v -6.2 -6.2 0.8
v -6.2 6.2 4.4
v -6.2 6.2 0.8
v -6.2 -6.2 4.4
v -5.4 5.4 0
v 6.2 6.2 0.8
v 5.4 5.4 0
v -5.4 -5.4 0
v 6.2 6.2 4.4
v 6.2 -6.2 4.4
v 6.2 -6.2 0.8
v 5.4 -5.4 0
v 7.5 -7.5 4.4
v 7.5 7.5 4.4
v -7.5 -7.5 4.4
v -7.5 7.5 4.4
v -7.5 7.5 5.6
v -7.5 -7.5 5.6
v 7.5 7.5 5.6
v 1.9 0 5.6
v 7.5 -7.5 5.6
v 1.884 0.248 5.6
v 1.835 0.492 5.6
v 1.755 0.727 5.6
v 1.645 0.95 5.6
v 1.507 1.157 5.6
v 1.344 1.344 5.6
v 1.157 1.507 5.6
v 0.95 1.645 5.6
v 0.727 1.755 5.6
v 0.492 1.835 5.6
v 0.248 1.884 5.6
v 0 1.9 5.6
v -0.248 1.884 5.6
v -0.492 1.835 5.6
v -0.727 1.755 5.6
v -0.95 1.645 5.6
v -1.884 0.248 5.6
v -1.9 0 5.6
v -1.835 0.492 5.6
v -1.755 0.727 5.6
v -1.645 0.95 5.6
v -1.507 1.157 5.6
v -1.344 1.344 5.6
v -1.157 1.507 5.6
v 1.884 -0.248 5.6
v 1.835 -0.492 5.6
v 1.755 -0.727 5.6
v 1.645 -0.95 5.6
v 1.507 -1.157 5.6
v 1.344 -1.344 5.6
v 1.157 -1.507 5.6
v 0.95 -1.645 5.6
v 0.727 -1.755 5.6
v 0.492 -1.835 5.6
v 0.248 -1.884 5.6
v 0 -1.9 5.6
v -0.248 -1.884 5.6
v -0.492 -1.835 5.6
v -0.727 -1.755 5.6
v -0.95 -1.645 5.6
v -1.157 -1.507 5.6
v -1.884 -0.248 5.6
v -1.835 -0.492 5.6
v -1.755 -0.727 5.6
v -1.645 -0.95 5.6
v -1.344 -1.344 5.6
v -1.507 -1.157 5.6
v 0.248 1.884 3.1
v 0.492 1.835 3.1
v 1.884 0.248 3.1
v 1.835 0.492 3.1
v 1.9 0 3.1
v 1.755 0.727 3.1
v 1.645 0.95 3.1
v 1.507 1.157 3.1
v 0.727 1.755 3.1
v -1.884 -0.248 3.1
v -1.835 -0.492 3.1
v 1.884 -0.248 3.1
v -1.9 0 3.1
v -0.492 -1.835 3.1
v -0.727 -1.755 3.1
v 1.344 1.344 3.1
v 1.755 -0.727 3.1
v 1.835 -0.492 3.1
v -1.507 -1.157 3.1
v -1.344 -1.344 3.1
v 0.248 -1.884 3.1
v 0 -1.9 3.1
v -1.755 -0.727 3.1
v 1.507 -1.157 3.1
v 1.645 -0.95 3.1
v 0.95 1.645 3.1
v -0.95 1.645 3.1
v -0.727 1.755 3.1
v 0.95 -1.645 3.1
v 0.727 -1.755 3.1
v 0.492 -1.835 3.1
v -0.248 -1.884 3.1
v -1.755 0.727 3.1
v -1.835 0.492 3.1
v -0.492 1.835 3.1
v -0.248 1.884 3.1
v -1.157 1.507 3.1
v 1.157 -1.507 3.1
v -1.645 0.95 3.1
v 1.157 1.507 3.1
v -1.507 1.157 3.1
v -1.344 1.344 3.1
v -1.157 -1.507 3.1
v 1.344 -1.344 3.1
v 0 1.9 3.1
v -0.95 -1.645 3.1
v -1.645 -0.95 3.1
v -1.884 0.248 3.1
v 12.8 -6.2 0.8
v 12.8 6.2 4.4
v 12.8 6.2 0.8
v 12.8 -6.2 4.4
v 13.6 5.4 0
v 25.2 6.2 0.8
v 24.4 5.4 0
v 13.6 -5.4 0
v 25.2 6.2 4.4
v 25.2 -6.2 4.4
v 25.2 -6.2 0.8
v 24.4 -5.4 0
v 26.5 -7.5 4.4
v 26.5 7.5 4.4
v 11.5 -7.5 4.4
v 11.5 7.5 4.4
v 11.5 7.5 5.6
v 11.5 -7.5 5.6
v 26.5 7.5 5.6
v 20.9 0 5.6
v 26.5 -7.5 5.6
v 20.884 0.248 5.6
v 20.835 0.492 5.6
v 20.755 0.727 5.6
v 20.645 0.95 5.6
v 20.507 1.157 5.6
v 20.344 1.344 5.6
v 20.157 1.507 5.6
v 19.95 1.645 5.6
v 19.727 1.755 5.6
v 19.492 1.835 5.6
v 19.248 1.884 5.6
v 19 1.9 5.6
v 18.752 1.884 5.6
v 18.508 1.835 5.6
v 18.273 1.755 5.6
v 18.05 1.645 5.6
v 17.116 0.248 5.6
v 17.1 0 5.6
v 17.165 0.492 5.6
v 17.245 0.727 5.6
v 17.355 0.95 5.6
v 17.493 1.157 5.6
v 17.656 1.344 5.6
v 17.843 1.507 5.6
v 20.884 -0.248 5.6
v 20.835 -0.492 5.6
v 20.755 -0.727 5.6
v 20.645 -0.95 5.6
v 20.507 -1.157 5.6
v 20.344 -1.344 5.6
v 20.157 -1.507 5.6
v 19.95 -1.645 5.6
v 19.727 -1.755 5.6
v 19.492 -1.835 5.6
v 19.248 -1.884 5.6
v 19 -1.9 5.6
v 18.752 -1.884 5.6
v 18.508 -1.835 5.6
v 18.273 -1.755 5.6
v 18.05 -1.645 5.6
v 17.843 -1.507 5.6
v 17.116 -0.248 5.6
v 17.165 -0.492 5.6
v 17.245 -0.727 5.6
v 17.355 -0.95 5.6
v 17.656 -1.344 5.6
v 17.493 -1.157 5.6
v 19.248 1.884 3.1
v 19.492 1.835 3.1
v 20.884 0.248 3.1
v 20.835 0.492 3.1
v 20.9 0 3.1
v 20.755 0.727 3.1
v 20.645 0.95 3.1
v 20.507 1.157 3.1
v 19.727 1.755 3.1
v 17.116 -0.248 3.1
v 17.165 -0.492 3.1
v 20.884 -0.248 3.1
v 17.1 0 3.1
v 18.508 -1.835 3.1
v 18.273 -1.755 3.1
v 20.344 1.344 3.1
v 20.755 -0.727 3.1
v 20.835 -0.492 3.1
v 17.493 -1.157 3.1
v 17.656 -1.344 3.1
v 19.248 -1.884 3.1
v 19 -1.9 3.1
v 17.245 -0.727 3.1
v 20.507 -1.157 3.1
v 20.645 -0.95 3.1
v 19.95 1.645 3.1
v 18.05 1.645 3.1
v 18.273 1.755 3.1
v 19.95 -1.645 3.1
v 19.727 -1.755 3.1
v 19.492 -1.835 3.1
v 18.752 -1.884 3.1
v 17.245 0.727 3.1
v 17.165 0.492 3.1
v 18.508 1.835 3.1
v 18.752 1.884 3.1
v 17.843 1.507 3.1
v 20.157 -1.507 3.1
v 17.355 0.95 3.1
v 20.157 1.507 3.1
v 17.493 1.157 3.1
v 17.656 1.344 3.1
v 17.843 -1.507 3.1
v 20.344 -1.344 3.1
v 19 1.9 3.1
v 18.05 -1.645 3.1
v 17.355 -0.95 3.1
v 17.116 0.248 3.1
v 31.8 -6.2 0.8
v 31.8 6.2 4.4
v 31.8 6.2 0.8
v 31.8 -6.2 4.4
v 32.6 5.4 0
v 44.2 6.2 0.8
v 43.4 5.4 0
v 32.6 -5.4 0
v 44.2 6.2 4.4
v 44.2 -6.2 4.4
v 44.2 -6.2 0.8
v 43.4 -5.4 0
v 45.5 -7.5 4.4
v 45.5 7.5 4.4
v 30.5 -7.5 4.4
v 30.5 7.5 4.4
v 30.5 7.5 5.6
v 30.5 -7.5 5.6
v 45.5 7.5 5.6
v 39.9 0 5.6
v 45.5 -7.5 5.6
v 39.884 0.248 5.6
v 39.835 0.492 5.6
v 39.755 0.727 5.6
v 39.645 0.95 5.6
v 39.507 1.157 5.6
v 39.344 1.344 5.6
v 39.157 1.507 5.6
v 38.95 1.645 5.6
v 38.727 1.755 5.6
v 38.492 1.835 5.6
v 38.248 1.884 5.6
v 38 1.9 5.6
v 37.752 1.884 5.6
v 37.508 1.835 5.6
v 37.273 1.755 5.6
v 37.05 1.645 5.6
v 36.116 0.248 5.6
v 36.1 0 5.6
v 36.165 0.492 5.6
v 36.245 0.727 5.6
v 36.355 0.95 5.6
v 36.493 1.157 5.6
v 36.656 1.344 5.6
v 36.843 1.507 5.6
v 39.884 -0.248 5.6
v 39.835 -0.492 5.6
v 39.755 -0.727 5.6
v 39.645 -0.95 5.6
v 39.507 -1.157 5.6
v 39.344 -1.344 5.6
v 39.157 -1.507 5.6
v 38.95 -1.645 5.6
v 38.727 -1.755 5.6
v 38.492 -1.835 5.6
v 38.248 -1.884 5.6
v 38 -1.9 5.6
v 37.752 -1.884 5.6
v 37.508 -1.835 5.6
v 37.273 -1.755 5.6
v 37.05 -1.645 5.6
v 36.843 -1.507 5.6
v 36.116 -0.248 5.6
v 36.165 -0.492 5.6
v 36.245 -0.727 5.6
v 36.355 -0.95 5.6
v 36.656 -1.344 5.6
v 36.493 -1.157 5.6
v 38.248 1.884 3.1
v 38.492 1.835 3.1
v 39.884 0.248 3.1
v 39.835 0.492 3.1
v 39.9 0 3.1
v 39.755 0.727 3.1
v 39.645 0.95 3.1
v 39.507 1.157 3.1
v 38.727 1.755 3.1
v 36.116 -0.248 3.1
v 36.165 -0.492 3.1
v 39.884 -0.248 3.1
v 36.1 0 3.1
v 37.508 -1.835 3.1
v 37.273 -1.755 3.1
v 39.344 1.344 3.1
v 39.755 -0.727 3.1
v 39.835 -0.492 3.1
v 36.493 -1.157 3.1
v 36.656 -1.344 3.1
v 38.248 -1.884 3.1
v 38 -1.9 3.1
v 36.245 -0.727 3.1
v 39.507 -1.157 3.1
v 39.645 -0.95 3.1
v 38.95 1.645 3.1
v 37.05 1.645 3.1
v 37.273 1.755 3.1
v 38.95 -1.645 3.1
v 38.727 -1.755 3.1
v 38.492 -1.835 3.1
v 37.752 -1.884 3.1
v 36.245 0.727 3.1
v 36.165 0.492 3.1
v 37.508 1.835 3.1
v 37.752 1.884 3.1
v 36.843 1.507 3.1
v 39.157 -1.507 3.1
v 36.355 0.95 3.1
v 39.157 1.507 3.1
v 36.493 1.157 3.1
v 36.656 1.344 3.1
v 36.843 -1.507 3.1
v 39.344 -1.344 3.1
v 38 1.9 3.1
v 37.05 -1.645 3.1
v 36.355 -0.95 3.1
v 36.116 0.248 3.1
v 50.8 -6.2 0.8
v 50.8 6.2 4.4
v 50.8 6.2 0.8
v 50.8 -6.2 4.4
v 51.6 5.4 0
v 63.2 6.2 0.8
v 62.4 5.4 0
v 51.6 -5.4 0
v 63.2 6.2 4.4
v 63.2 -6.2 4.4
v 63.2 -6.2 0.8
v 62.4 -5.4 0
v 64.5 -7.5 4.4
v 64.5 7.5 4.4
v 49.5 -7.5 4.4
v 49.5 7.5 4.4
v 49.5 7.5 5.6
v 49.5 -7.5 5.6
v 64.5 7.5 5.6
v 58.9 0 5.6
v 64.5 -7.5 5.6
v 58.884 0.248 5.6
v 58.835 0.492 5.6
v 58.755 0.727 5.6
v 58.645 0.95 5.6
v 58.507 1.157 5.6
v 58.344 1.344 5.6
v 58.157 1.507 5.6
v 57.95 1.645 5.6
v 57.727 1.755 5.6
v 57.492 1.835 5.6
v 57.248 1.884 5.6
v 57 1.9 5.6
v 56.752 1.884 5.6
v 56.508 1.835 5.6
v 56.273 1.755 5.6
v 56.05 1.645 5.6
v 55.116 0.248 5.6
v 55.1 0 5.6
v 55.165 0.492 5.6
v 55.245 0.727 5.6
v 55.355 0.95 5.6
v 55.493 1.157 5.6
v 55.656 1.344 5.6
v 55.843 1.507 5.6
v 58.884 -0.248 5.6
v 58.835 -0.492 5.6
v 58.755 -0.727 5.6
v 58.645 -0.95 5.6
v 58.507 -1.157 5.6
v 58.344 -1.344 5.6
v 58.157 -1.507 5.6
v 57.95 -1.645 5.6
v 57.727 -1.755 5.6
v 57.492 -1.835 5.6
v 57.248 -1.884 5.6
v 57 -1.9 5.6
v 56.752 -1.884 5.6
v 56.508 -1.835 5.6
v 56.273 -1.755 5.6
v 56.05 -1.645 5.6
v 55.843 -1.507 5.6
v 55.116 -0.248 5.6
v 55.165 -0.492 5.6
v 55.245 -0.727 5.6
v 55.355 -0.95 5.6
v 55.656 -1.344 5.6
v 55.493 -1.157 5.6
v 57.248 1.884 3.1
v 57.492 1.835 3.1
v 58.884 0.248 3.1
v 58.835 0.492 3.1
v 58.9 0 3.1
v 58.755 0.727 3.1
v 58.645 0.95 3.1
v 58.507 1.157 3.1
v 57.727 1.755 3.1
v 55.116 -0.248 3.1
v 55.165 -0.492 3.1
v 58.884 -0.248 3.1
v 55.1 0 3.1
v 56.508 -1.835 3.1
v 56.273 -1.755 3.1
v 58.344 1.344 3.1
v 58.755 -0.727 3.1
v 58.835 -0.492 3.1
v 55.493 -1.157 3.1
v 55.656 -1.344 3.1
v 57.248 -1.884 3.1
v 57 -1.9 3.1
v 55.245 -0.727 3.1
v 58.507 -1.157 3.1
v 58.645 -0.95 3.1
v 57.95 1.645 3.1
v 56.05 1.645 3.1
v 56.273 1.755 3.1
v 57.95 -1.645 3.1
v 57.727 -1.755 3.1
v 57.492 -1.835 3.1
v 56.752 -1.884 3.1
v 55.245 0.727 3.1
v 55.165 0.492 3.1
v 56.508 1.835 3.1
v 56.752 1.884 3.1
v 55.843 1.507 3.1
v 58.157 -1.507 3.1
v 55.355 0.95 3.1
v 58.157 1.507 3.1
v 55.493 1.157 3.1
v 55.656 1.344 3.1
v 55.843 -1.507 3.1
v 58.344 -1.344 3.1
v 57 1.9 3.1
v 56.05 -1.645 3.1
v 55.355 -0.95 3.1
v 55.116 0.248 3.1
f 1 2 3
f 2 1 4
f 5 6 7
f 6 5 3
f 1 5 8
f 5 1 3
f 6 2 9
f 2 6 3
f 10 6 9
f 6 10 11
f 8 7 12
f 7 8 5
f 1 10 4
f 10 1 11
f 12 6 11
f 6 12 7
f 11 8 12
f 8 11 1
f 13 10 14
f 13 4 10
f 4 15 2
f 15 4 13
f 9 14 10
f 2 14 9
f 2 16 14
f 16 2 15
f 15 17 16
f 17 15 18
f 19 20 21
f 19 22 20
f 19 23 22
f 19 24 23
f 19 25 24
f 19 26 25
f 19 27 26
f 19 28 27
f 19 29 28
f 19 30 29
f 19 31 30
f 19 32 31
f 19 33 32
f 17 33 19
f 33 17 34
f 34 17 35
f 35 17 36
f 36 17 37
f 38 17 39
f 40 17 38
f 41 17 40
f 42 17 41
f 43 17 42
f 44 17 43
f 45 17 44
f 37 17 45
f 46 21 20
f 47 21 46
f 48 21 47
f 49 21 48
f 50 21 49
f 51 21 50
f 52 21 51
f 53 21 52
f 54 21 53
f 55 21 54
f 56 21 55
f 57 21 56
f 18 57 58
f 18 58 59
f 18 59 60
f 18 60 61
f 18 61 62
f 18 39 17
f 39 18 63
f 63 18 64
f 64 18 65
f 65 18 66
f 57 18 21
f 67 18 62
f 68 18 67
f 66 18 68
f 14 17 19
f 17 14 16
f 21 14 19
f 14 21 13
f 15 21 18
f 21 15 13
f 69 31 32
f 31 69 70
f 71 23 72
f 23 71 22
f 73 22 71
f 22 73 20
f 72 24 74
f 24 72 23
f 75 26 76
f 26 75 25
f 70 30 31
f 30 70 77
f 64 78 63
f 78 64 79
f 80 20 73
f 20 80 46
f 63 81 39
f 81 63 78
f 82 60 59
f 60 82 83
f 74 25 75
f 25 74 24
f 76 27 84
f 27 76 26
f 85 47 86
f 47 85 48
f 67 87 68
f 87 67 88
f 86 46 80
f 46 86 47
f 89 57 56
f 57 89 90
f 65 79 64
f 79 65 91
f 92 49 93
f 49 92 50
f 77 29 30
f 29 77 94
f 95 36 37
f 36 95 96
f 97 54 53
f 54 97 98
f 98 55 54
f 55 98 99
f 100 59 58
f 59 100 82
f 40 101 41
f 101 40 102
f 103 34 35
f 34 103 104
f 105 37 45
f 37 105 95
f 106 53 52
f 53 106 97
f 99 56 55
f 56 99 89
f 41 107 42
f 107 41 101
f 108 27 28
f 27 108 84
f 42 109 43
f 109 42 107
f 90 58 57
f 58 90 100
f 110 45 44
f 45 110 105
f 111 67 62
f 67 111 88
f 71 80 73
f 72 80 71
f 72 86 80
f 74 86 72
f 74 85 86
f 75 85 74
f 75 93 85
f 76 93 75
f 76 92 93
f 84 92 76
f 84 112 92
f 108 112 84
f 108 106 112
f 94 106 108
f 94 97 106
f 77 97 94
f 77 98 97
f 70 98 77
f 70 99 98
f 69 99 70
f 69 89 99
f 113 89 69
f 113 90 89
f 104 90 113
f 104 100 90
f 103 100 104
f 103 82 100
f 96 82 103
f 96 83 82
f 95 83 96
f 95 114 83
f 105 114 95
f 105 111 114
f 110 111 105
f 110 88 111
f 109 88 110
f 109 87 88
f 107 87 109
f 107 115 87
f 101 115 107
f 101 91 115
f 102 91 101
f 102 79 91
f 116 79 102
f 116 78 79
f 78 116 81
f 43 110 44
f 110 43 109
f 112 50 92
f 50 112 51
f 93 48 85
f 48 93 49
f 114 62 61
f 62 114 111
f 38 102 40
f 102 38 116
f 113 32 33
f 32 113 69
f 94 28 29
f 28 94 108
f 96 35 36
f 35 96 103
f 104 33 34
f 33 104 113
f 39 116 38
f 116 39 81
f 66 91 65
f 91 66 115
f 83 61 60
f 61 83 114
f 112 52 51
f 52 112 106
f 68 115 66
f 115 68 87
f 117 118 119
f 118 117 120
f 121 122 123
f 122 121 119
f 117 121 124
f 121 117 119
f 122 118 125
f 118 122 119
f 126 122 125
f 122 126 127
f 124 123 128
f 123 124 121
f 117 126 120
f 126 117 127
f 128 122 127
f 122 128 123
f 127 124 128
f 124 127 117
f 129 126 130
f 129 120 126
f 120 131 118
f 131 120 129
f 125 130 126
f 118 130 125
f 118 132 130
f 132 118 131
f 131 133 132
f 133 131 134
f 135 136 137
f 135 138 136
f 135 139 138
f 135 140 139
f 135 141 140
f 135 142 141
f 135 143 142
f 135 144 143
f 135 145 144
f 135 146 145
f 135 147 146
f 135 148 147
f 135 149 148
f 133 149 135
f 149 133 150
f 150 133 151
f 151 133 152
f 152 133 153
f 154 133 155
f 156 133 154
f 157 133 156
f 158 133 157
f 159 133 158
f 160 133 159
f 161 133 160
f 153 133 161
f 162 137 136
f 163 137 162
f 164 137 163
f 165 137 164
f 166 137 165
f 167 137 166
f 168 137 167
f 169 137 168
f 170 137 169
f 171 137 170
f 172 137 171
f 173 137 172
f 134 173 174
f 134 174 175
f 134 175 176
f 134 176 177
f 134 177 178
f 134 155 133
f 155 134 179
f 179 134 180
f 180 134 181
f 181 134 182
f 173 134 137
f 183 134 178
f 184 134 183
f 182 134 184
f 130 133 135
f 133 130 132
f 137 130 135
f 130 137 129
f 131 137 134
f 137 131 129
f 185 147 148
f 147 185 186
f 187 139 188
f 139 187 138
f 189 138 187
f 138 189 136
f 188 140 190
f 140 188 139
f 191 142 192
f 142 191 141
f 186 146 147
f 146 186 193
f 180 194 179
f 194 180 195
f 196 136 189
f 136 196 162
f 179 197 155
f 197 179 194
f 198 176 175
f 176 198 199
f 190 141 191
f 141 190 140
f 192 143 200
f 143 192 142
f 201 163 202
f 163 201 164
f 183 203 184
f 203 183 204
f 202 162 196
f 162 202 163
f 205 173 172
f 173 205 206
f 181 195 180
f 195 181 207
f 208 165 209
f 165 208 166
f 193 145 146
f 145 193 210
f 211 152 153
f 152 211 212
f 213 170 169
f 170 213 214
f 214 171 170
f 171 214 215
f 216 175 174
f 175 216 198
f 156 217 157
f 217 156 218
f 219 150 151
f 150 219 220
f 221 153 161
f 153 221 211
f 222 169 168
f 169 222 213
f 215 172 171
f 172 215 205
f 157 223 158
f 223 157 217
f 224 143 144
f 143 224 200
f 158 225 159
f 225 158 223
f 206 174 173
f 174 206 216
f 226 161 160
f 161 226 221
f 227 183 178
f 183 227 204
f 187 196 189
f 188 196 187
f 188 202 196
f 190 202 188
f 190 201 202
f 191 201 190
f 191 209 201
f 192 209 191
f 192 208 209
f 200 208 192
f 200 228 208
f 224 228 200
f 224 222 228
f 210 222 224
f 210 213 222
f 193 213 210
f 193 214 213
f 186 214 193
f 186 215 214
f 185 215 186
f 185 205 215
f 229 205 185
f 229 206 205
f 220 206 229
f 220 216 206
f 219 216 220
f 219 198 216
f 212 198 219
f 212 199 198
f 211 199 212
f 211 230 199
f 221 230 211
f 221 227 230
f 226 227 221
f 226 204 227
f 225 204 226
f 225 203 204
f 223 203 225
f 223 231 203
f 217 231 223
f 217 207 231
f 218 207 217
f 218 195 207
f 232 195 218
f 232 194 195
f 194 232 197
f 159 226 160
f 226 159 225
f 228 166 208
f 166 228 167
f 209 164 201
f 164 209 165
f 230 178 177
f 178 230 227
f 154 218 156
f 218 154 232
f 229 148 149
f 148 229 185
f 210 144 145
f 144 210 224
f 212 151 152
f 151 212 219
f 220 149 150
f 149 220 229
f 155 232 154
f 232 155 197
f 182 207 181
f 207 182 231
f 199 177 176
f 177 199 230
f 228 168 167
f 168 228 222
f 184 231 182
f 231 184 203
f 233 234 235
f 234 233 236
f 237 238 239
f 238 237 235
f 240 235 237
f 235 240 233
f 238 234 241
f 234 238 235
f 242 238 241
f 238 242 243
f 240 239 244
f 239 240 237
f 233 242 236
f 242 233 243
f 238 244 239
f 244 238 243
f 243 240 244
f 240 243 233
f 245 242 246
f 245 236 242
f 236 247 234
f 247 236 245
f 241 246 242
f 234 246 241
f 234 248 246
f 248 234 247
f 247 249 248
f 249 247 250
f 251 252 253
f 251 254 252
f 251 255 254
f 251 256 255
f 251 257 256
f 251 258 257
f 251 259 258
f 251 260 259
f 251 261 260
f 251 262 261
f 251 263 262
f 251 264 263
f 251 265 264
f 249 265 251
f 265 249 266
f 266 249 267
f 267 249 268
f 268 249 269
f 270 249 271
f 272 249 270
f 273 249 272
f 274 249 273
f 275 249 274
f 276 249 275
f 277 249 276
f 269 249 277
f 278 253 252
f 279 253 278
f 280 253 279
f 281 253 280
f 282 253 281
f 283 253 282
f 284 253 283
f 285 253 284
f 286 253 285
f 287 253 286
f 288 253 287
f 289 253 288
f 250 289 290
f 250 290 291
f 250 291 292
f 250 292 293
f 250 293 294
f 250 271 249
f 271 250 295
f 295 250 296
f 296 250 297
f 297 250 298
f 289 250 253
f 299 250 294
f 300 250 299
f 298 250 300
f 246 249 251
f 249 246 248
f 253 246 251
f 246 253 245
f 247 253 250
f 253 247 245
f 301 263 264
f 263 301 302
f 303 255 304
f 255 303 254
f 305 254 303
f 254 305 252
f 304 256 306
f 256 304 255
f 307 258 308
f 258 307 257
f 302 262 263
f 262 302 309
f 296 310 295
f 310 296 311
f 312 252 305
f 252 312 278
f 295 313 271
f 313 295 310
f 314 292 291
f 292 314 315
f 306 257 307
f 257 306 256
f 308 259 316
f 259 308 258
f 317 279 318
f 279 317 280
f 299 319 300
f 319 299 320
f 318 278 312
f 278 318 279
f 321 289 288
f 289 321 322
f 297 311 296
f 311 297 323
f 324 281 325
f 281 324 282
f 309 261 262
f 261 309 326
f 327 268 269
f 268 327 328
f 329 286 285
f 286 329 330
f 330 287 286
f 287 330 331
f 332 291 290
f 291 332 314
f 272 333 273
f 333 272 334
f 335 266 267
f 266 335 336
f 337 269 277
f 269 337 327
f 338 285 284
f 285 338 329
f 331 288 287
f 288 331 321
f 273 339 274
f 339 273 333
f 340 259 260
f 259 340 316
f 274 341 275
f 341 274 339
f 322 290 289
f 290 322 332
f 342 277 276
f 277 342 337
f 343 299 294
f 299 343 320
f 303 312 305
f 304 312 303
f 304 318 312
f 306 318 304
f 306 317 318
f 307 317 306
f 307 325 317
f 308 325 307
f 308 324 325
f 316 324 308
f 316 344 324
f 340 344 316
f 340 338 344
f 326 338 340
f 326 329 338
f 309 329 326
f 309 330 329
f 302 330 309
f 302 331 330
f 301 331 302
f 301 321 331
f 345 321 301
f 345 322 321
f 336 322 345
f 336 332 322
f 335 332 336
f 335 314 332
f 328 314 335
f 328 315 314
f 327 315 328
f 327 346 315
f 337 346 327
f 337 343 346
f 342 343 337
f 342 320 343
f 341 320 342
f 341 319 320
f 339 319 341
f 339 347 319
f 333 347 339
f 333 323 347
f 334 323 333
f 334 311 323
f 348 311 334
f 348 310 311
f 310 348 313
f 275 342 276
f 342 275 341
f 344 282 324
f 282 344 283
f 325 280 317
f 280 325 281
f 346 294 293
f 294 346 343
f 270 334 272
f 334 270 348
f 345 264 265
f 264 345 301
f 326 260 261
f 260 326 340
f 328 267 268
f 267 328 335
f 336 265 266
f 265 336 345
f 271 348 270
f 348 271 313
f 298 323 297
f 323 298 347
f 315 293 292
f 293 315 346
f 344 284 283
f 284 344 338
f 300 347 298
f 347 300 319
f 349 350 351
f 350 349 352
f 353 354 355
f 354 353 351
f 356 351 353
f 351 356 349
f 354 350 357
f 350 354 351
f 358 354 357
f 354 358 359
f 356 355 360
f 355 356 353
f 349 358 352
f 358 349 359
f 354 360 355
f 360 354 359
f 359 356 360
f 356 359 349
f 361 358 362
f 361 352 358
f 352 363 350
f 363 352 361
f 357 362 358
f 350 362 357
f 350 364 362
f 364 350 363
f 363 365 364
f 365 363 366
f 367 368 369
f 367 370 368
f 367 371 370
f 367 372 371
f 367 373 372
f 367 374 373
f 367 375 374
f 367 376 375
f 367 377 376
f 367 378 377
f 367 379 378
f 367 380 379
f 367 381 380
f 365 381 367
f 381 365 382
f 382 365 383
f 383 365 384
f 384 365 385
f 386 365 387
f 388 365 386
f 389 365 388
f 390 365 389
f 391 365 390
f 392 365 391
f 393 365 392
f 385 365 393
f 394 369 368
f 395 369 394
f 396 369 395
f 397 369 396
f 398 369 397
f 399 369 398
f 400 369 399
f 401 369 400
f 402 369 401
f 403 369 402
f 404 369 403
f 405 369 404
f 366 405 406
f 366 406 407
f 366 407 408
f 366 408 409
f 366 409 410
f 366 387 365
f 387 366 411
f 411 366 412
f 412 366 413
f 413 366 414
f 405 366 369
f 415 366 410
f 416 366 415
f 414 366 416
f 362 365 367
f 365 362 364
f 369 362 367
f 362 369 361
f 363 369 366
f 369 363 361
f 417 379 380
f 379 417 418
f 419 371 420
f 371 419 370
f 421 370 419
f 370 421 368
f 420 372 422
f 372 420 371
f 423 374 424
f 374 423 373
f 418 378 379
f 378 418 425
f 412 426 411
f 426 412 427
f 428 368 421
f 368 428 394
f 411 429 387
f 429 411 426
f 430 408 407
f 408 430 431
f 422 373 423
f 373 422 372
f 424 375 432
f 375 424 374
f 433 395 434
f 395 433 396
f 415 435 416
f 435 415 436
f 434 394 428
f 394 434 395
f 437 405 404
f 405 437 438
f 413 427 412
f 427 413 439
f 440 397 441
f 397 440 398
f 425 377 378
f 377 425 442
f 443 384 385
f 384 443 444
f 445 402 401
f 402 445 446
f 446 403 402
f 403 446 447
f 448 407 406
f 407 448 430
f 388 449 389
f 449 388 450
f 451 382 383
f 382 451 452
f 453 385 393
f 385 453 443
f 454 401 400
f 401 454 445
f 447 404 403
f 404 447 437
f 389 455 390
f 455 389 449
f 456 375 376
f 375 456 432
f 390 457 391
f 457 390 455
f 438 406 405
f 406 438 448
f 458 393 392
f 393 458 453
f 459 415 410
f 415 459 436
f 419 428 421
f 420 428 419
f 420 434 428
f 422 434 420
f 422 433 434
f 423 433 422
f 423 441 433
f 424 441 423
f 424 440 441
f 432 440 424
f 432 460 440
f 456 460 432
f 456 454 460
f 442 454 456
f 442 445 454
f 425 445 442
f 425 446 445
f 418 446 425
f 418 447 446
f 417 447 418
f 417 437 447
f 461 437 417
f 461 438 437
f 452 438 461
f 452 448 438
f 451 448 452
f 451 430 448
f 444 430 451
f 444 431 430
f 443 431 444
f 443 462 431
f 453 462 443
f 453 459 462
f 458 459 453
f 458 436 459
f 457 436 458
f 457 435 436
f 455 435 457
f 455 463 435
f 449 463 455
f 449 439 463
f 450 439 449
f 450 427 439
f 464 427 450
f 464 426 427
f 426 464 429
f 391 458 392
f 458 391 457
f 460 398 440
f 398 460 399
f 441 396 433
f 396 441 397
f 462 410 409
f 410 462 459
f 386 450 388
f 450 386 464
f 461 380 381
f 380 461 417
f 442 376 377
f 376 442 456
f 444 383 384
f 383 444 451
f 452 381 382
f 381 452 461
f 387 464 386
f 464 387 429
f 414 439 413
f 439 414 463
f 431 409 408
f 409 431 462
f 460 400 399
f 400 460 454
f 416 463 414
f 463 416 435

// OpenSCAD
// PiSDR keycaps for the four 12 mm tactile switches. Printed top-down (as modelled).
// The square skirt rides in the faceplate hole, the flange behind the faceplate stops the
// cap falling out, and the plunger of the switch sits in the socket underneath.
include <pisdr_params.scad>

skirt_len = keycap_proud + face_t;                 // from the top face to the faceplate rear
cap_total = skirt_len + keycap_rest_gap + keycap_flange_t;

module keycap(legend = "") {
    difference() {
        union() {
            // skirt + visible top (slightly rounded top edge)
            hull() {
                translate([0, 0, 0.8]) linear_extrude(skirt_len - 0.8) square(keycap_top, center = true);
                linear_extrude(0.8) square(keycap_top - 1.6, center = true);
            }
            // flange
            translate([0, 0, skirt_len + keycap_rest_gap]) linear_extrude(keycap_flange_t)
                square(keycap_flange, center = true);
            // solid between skirt and flange (fills the rest gap)
            translate([0, 0, skirt_len - eps]) linear_extrude(keycap_rest_gap + 2 * eps)
                square(keycap_top, center = true);
        }
        // plunger socket from the back
        translate([0, 0, cap_total - keycap_socket_depth]) cylinder(d = key_plunger_d + 0.3, h = keycap_socket_depth + 1);
        // optional engraved legend on the top face
        if (legend != "") translate([0, 0, -eps]) linear_extrude(0.5) mirror([1, 0, 0])
            text(legend, size = 5, halign = "center", valign = "center");
    }
}

// Four caps laid out for printing; legends are optional since the screen labels the keys.
for (i = [0:3]) translate([i * (keycap_flange + 4), 0, 0]) keycap();
